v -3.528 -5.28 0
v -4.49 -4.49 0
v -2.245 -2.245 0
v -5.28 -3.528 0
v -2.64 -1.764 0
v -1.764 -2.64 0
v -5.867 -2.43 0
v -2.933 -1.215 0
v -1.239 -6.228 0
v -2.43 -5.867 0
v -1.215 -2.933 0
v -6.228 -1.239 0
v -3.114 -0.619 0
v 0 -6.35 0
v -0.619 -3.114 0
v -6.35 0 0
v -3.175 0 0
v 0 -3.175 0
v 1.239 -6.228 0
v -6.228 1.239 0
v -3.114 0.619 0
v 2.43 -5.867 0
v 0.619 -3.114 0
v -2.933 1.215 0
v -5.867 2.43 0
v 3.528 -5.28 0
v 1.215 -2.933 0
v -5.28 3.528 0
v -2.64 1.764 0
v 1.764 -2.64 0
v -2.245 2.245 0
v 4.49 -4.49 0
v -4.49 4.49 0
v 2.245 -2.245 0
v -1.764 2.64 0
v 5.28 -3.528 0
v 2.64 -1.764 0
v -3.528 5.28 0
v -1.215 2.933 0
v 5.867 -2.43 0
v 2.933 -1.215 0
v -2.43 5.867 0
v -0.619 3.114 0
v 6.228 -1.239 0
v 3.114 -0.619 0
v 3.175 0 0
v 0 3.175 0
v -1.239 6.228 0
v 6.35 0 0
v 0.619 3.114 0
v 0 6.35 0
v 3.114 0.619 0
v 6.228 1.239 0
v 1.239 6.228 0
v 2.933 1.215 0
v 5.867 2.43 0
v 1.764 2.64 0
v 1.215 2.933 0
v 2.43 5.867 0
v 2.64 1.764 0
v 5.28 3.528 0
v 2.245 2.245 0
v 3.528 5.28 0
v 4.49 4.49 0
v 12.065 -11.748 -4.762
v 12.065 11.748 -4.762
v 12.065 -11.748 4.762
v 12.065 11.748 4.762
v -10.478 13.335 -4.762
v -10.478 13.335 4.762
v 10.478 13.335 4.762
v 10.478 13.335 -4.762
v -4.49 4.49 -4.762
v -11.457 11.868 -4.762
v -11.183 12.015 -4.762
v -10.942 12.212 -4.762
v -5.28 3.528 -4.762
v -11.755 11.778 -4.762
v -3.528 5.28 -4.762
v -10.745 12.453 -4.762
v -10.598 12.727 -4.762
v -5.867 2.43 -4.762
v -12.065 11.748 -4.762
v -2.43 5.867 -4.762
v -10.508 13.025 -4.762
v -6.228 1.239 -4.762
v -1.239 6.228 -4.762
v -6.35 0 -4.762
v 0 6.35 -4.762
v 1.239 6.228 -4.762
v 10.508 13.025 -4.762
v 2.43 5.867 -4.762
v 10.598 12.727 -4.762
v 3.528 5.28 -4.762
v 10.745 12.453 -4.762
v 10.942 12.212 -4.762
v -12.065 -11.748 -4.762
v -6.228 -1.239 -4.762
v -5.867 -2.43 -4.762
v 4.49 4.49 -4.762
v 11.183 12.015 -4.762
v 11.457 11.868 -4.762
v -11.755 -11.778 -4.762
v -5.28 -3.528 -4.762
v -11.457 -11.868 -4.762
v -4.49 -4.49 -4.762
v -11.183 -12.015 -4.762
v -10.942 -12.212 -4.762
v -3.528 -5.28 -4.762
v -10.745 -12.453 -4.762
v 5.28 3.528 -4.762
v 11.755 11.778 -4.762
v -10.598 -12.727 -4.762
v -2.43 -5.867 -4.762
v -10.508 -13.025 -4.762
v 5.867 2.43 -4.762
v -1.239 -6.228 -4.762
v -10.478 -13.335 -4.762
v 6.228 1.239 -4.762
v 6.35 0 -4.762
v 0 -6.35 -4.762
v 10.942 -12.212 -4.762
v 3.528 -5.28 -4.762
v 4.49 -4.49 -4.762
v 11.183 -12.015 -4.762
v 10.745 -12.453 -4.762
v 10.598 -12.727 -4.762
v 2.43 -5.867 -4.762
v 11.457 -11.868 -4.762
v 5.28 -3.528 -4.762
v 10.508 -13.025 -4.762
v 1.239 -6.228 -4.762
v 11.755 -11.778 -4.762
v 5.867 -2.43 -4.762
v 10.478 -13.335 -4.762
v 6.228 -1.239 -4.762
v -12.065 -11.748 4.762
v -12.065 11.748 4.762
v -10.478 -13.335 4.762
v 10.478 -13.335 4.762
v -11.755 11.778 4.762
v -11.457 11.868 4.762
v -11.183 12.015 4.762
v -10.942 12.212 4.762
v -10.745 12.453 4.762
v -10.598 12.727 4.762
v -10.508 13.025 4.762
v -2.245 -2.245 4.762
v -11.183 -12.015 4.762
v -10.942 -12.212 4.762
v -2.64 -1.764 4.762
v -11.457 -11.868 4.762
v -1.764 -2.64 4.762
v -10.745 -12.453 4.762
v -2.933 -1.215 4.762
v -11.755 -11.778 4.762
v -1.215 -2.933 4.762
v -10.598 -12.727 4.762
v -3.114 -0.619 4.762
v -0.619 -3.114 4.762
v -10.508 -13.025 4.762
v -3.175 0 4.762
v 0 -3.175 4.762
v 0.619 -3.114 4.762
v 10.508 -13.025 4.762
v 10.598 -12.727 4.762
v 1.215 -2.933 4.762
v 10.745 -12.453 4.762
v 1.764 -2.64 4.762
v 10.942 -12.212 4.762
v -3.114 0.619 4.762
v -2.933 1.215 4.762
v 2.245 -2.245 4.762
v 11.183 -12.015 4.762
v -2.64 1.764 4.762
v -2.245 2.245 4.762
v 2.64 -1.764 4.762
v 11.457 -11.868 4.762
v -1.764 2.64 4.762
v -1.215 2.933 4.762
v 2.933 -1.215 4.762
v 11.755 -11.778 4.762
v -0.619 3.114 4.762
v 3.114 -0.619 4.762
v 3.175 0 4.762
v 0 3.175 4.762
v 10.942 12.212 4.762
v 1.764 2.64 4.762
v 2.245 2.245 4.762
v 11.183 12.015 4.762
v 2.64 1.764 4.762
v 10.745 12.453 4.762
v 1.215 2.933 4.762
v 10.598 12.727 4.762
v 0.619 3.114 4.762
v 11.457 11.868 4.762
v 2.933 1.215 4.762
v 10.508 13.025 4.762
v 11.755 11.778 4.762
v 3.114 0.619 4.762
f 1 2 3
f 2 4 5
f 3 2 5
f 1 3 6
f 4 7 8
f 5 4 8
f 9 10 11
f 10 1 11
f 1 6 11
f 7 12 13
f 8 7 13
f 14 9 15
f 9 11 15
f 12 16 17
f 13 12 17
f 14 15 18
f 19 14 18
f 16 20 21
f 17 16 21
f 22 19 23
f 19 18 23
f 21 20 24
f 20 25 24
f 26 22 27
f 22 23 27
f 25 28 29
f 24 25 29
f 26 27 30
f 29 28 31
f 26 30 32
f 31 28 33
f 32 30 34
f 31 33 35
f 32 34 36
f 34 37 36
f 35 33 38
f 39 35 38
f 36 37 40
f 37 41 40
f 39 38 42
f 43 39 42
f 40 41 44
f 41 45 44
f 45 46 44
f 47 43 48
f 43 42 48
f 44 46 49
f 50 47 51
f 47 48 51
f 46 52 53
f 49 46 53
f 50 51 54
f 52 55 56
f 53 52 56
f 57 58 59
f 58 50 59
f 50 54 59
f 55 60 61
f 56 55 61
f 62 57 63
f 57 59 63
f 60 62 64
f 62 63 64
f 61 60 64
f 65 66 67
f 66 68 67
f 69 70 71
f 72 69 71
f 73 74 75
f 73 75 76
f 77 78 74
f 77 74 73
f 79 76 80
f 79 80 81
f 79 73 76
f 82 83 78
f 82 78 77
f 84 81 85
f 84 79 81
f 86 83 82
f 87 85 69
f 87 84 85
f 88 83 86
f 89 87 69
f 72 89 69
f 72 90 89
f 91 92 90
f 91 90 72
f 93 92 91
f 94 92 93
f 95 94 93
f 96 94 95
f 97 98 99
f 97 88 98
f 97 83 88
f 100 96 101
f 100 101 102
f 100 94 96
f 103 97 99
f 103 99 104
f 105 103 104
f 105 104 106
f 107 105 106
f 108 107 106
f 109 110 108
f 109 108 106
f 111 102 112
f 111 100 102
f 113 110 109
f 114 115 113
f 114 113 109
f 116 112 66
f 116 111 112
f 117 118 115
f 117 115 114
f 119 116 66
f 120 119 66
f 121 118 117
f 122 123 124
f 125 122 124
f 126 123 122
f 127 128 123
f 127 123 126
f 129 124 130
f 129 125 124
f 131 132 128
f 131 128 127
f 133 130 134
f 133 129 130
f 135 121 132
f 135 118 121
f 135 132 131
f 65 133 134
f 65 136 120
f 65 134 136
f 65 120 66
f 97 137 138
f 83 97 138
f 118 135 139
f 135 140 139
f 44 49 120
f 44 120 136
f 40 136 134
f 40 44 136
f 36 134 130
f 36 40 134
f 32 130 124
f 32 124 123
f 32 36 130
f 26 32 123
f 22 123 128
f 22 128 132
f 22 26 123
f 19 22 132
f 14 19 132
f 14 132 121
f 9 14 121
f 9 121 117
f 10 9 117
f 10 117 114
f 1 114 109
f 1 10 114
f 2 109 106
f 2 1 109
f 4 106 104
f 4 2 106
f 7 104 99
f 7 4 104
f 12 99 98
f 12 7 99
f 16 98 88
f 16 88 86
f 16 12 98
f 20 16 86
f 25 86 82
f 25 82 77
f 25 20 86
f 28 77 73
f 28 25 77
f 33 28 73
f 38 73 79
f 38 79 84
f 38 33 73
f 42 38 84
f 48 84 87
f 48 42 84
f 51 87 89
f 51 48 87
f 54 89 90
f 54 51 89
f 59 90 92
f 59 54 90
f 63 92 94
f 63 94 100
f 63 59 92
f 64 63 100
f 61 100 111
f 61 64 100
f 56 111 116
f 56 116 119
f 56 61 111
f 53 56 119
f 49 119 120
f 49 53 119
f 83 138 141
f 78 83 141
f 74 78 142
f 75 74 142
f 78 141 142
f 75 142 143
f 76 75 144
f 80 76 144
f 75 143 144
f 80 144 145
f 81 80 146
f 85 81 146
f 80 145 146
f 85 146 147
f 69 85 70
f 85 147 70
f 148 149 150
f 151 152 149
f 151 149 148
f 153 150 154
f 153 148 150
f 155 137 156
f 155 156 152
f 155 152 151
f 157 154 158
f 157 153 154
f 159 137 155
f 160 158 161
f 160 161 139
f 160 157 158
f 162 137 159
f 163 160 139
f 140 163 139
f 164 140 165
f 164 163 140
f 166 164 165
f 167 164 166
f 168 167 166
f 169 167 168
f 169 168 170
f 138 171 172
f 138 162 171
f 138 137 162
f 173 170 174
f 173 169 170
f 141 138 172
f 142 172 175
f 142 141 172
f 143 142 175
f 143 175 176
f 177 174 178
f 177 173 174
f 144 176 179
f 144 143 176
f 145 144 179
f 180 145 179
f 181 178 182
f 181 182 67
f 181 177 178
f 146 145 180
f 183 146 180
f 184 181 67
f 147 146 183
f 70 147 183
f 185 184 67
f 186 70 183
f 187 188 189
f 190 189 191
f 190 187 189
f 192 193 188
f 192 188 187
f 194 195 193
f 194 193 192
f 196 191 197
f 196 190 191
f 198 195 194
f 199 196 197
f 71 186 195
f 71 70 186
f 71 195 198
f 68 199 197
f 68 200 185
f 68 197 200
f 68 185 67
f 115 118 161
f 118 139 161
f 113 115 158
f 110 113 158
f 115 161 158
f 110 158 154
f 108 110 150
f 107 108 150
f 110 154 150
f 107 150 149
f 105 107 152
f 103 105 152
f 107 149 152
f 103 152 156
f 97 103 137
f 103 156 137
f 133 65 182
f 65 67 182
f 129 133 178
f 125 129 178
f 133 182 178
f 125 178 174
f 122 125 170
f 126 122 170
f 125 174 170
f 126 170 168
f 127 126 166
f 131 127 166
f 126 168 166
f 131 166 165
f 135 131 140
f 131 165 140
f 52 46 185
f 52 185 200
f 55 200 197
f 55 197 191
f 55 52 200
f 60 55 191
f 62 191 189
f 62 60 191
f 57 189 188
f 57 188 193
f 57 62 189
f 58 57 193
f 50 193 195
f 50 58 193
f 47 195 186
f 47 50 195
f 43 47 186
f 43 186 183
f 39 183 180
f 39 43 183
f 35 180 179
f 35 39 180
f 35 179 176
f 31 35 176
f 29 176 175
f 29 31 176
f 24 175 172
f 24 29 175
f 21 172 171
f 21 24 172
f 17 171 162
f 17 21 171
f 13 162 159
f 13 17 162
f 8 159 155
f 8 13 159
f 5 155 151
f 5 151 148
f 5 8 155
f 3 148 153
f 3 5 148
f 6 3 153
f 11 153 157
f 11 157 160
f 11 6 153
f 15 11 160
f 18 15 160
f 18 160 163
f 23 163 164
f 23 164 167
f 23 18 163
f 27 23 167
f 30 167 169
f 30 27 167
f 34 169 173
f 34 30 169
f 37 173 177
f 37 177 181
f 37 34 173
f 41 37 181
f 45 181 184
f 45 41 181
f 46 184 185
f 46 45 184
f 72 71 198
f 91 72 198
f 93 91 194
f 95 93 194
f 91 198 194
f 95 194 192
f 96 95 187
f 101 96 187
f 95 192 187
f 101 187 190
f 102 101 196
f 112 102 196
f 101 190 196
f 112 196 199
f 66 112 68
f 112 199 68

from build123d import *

# Parameters (mm, degrees)
F0_R     = 3.175
F1_DEPTH = 4.7625
F2_R     = 6.35
F3_DEPTH = 4.7625


with BuildPart() as f1:
    # F0 (on Top) → F1 (new body)
    with BuildSketch(Plane.XY):
        with BuildLine():
            Line((10.4775, 13.335), (-10.4775, 13.335))
            ThreePointArc((-10.4775, 13.335), (-10.942468, 12.212468), (-12.065, 11.7475))
            Line((-12.065, 11.7475), (-12.065, -11.7475))
            ThreePointArc((-12.065, -11.7475), (-10.942468, -12.212468), (-10.4775, -13.335))
            Line((-10.4775, -13.335), (10.4775, -13.335))
            ThreePointArc((10.4775, -13.335), (10.942468, -12.212468), (12.065, -11.7475))
            Line((12.065, -11.7475), (12.065, 11.7475))
            ThreePointArc((12.065, 11.7475), (10.942468, 12.212468), (10.4775, 13.335))
        make_face()
        Circle(F0_R, mode=Mode.SUBTRACT)
    extrude(amount=F1_DEPTH)

    # F2 (on face) → F3 (join)
    with BuildSketch(Plane(origin=(0, 0, 0), x_dir=(1, 0, 0), z_dir=(0, 0, -1))):
        with BuildLine():
            ThreePointArc((10.4775, -13.335), (10.942468, -12.212468), (12.065, -11.7475))
            Line((12.065, -11.7475), (12.065, 11.7475))
            ThreePointArc((12.065, 11.7475), (10.942468, 12.212468), (10.4775, 13.335))
            Line((10.4775, 13.335), (-10.4775, 13.335))
            ThreePointArc((-10.4775, 13.335), (-10.942468, 12.212468), (-12.065, 11.7475))
            Line((-12.065, 11.7475), (-12.065, -11.7475))
            ThreePointArc((-12.065, -11.7475), (-10.942468, -12.212468), (-10.4775, -13.335))
            Line((-10.4775, -13.335), (10.4775, -13.335))
        make_face()
        Circle(F2_R, mode=Mode.SUBTRACT)
    extrude(amount=F3_DEPTH)


solid = f1.part
